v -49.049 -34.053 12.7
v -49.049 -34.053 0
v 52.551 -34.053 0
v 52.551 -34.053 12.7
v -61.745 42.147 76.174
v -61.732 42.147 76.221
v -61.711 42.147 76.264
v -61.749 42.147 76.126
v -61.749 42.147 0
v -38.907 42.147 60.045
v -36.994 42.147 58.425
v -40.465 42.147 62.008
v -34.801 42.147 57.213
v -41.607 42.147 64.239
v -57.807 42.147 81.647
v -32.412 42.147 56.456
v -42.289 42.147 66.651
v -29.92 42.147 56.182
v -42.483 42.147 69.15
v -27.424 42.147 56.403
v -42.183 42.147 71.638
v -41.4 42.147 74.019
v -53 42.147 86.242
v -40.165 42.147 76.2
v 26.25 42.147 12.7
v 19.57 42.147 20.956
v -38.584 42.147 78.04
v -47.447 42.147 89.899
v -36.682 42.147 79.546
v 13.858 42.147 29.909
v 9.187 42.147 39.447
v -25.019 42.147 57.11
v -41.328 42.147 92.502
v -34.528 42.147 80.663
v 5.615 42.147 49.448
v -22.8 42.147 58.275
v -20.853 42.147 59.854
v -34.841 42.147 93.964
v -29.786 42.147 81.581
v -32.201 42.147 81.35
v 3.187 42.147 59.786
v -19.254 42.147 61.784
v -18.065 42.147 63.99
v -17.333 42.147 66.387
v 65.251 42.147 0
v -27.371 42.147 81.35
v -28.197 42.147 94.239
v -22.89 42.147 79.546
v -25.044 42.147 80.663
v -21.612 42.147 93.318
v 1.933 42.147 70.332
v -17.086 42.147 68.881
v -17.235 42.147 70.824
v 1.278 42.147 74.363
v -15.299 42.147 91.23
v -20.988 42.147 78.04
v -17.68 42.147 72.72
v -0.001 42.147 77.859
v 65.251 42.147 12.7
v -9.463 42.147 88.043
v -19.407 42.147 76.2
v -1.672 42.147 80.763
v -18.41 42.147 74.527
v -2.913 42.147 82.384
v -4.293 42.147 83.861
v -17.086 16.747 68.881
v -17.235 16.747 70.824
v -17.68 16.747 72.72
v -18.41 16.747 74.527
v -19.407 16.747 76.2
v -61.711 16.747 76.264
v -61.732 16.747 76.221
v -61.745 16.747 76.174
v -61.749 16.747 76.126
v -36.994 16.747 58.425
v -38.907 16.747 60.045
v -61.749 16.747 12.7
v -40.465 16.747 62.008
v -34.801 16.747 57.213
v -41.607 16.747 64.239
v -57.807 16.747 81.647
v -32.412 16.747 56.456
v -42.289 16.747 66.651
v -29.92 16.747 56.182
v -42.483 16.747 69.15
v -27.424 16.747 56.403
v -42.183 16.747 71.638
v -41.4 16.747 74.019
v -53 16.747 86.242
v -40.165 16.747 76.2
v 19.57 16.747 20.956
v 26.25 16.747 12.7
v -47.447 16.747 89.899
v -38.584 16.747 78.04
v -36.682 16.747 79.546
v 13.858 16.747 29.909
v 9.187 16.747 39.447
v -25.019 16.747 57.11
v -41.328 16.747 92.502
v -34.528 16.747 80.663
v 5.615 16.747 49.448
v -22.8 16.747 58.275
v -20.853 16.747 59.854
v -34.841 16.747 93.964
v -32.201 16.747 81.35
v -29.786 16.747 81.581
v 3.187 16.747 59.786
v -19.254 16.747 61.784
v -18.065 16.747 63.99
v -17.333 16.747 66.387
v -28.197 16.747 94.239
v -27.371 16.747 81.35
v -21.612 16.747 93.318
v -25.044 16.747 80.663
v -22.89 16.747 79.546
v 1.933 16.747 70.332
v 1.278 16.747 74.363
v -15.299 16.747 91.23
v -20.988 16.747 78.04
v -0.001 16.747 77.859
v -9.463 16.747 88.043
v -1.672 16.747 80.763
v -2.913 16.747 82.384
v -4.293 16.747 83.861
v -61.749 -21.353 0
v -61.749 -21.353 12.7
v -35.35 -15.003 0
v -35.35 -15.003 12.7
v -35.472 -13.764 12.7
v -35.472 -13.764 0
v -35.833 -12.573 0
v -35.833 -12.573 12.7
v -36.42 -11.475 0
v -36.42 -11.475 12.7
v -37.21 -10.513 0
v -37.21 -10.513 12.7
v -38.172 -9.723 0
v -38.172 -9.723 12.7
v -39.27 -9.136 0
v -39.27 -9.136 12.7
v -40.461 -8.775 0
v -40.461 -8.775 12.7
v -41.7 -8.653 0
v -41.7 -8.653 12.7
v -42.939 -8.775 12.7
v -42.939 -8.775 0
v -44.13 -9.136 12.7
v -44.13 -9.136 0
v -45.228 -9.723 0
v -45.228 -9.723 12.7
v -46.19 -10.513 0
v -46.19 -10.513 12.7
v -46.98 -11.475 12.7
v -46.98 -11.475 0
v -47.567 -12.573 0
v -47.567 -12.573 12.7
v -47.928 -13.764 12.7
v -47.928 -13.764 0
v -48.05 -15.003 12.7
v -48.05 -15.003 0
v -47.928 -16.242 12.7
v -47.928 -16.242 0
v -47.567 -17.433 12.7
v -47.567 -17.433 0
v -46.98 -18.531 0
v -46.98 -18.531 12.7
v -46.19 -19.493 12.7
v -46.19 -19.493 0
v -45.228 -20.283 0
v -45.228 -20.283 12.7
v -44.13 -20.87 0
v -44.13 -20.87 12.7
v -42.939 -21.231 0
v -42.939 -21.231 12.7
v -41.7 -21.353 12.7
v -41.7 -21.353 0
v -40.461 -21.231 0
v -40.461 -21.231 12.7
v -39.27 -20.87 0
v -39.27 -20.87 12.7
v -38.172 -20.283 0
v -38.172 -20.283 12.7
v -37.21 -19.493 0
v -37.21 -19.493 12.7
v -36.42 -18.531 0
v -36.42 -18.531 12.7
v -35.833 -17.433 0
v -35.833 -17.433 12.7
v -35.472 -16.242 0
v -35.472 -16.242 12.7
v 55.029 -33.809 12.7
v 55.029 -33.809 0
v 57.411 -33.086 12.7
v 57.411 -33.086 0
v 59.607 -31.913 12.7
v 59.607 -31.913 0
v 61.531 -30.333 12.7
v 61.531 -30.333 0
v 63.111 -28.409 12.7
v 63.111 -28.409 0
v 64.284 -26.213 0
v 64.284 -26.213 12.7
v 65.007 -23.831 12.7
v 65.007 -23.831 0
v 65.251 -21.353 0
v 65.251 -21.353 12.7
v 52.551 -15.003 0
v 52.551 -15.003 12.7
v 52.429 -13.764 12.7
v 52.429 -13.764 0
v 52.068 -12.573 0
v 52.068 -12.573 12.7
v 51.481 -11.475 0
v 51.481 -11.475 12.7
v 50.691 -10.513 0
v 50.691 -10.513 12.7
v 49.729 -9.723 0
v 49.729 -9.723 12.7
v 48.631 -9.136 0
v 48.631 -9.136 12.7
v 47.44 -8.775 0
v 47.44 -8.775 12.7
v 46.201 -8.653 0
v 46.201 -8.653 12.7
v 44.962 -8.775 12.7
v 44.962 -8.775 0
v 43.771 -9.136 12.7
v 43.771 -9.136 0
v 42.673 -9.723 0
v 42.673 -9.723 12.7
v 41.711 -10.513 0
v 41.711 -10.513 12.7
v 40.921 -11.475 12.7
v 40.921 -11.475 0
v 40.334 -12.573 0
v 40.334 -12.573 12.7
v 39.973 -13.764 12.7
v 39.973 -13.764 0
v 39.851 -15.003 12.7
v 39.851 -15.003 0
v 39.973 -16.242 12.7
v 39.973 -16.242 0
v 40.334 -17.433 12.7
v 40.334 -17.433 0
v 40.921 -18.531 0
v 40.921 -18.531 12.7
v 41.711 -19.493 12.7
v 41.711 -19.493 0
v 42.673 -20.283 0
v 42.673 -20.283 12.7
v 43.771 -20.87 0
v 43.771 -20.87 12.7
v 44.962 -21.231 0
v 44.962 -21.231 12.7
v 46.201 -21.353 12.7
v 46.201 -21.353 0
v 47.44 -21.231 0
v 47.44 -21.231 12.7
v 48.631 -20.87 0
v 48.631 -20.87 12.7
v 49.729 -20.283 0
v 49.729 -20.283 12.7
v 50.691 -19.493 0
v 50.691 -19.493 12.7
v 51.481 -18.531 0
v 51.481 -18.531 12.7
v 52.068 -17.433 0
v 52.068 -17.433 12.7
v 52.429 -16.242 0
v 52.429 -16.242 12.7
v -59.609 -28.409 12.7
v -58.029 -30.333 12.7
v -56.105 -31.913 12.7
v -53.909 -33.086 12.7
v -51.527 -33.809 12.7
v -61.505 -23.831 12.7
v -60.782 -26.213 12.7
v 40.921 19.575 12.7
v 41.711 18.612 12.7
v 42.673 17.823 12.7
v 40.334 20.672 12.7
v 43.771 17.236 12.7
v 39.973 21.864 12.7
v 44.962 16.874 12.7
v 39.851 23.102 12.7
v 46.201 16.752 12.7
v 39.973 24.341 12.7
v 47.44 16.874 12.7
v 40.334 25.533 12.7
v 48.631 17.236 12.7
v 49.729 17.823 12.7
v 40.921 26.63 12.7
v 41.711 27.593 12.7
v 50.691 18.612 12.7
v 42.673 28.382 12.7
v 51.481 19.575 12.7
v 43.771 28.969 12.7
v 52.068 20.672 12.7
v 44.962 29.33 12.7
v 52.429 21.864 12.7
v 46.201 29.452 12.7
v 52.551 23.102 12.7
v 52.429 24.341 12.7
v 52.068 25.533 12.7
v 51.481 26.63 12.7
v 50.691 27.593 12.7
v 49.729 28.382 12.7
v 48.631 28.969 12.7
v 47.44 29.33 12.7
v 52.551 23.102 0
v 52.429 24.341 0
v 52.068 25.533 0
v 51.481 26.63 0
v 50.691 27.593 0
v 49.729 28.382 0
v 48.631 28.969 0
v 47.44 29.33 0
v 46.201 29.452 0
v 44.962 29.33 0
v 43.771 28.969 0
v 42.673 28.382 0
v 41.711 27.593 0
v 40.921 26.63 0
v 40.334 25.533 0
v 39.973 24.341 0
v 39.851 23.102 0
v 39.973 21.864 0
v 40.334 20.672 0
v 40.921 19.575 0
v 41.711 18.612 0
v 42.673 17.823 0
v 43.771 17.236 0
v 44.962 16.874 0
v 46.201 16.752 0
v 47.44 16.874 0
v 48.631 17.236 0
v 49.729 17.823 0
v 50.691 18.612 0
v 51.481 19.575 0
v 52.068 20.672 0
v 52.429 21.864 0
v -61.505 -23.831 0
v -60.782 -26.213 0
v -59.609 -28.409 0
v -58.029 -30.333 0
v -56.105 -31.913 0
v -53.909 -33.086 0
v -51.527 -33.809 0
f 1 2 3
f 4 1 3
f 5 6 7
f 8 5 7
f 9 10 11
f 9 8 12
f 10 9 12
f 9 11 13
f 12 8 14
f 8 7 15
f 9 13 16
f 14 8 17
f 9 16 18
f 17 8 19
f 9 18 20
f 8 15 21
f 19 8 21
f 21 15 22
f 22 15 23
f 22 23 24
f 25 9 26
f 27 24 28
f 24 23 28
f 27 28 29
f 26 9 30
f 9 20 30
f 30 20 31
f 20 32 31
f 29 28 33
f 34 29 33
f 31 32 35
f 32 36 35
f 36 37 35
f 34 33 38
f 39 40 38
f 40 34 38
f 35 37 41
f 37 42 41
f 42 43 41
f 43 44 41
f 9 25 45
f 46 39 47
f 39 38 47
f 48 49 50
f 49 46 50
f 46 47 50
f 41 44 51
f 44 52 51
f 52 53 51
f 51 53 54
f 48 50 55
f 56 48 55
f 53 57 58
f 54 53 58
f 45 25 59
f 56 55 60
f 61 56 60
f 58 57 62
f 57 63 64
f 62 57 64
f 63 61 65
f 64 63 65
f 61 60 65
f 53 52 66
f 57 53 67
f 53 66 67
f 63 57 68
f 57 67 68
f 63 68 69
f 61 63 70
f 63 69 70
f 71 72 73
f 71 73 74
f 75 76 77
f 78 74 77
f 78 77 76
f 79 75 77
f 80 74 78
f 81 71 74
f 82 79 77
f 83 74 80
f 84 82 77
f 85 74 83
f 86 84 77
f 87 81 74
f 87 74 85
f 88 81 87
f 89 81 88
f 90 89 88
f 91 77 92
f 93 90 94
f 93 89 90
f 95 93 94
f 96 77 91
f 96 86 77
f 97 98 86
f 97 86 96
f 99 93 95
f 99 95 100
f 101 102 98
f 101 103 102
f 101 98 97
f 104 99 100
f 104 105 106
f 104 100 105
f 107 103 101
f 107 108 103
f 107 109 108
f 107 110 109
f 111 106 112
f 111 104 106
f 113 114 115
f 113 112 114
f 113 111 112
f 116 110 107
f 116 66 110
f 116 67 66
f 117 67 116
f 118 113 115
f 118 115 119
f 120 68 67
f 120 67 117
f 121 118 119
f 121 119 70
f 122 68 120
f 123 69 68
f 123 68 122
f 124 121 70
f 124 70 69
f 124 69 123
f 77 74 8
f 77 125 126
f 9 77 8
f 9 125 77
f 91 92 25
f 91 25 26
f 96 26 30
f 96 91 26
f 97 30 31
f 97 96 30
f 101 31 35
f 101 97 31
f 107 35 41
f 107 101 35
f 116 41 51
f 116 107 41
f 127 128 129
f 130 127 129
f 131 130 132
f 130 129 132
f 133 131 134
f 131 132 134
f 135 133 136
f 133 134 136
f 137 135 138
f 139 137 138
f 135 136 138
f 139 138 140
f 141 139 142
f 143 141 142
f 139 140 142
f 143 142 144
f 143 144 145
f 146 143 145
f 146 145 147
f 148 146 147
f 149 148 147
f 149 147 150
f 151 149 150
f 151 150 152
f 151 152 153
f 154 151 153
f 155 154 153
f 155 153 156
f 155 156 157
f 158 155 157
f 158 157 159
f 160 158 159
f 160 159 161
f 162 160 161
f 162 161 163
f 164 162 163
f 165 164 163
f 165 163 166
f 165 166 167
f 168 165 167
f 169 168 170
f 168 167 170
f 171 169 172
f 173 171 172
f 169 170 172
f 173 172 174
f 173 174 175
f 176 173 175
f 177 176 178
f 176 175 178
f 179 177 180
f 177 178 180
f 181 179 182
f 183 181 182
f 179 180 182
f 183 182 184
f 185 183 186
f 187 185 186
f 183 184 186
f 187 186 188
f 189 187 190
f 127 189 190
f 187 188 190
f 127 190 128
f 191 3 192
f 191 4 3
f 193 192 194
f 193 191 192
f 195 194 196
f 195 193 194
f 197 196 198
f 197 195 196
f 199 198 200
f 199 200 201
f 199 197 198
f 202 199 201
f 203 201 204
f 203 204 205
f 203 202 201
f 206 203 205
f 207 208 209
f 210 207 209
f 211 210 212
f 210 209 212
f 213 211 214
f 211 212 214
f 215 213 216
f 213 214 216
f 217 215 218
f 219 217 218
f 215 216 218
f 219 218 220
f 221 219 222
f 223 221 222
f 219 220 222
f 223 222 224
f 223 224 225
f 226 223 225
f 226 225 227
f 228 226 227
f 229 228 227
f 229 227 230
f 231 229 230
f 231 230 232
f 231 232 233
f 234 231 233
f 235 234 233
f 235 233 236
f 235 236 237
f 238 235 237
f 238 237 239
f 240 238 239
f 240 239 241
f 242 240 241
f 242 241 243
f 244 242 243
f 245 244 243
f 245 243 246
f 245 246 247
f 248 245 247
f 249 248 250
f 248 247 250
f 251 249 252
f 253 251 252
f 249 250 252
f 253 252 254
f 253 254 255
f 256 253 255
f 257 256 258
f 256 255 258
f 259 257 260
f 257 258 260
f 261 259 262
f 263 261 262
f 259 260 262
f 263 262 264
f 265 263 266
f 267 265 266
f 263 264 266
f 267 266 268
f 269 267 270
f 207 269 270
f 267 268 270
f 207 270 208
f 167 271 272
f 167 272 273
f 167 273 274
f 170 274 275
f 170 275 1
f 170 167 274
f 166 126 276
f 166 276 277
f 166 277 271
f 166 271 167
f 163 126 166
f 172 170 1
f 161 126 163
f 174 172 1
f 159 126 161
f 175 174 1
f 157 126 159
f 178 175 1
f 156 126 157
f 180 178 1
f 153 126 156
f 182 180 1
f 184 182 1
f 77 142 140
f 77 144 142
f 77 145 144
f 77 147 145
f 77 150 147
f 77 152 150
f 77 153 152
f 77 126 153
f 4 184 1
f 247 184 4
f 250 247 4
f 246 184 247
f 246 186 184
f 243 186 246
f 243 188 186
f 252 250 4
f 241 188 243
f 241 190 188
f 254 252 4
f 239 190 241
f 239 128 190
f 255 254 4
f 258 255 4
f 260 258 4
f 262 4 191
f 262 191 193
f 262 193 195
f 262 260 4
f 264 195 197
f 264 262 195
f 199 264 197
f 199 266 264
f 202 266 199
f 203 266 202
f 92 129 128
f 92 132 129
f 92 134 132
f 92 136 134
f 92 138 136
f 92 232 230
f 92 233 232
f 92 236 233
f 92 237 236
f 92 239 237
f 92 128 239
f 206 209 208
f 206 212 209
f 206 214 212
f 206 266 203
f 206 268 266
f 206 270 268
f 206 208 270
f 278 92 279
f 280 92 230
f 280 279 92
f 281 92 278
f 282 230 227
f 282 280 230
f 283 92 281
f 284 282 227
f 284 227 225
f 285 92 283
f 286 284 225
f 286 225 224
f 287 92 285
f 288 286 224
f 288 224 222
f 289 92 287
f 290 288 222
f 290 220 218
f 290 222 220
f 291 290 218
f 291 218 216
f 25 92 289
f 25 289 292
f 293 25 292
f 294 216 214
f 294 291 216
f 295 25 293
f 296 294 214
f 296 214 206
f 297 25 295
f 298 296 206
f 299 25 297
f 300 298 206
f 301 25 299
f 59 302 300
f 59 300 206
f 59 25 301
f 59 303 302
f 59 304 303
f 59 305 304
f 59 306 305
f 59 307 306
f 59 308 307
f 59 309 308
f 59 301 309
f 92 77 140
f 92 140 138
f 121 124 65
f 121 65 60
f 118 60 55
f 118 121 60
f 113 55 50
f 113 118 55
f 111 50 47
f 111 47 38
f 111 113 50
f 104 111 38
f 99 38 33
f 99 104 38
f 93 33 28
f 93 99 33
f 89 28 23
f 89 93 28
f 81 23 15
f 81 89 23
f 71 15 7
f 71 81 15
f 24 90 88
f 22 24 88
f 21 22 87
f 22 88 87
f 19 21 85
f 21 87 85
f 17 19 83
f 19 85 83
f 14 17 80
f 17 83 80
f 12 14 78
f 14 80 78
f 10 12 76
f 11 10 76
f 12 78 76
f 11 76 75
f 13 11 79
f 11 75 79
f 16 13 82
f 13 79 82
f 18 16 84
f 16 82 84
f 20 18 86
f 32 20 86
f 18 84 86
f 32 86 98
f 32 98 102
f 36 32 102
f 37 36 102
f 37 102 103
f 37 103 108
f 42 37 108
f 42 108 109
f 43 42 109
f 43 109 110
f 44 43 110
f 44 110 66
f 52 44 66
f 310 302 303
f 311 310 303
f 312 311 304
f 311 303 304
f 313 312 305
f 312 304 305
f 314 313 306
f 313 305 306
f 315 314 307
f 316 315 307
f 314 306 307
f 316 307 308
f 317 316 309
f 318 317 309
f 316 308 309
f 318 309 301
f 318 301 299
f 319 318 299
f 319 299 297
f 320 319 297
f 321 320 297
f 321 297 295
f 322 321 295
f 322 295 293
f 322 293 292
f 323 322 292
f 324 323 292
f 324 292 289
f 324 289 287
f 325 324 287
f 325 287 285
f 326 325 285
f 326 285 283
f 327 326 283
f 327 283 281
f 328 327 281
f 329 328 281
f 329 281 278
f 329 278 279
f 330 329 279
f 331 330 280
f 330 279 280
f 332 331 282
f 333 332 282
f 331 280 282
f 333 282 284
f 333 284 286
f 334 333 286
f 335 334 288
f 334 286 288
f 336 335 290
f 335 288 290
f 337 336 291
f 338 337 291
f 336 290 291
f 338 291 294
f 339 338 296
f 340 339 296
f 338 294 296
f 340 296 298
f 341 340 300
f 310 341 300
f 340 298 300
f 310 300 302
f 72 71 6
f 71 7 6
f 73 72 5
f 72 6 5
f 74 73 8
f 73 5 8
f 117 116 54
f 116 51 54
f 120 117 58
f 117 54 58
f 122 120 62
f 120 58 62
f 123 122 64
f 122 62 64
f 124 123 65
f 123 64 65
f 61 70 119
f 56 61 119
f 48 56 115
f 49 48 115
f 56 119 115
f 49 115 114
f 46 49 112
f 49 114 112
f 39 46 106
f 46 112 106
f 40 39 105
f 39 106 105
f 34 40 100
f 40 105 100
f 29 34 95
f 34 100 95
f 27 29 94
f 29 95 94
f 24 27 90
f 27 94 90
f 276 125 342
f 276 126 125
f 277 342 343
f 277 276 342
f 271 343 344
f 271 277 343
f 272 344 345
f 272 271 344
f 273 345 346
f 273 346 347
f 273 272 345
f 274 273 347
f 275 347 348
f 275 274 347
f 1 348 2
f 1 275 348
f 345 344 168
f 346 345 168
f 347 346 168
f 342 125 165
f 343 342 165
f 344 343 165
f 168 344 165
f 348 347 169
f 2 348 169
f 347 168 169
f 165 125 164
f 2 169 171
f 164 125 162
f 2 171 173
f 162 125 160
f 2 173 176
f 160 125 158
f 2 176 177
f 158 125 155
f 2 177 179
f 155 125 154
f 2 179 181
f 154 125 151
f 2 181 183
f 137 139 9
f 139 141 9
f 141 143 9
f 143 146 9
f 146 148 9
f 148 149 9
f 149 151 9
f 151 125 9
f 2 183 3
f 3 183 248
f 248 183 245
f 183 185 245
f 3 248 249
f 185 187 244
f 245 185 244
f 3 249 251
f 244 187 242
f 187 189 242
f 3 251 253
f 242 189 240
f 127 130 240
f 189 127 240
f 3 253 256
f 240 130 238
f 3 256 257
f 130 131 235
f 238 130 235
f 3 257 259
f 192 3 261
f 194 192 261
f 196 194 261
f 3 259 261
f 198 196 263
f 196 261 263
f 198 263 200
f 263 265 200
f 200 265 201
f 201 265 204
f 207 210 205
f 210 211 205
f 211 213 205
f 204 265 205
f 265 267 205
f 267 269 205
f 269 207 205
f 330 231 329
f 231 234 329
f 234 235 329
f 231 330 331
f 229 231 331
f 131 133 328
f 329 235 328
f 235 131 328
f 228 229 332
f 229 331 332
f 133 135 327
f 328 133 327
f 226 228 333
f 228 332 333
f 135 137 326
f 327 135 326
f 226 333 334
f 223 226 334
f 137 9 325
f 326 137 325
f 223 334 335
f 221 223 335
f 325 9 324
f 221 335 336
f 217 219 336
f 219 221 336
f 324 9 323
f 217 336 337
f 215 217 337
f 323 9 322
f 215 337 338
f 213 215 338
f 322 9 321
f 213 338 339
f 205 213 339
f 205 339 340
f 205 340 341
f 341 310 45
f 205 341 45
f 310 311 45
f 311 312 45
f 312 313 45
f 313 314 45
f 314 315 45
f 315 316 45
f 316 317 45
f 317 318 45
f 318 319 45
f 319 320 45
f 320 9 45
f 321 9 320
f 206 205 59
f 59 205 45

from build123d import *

# Parameters (mm, degrees)
F0_W      = 127
F0_H      = 76.2
F1_DEPTH  = 12.7
F2_R      = 12.7
F3_R      = 12.7
F4_W      = 63.5
F4_H      = 25.4
F5_DEPTH  = 63.5
F7_DEPTH  = 25.4
F8_DEPTH  = 25.4
F9_R      = 20.636463447
F11_DEPTH = 25.4010001
F12_DEPTH = 25.4010001
F13_R     = 0.2708197303
F14_R     = 6.35
F15_DEPTH = 12.7010001
F16_DEPTH = 12.7010001
F17_DEPTH = 12.7010001


with BuildPart() as f1:
    # F0 (on Top) → F1 (new body)
    with BuildSketch(Plane.XY):
        with Locations((1.7509019642, 4.0471330285)):
            Rectangle(F0_W, F0_H)
    extrude(amount=F1_DEPTH)

    # F2
    f2_edges = [f1.edges().sort_by_distance(p)[0] for p in [
        (-61.749098, -34.052867, 6.35),
    ]]
    fillet(f2_edges, radius=F2_R)

    # F3
    f3_edges = [f1.edges().sort_by_distance(p)[0] for p in [
        (65.250902, -34.052867, 6.35),
    ]]
    fillet(f3_edges, radius=F3_R)

    # F4 (on face) → F5 (join)
    with BuildSketch(Plane.XY.offset(12.7)):
        with Locations((-29.9990980358, 29.4471330285)):
            Rectangle(F4_W, F4_H)
    extrude(amount=F5_DEPTH)

    # F6 (on face) → F7 (join)
    with BuildSketch(Plane.XZ.offset(-16.7471330285)):
        with BuildLine():
            Line((-61.7490980358, 76.2), (1.7509019642, 76.2))
            ThreePointArc((1.7509019642, 76.2), (-29.9990980358, 94.2832173296), (-61.7490980358, 76.2))
        make_face()
    extrude(amount=-F7_DEPTH)

    # F6 (on face) → F8 (join)
    with BuildSketch(Plane.XZ.offset(-16.7471330285)):
        with BuildLine():
            ThreePointArc((26.2496182163, 12.7), (8.0879587681, 42.1689953939), (1.7509019642, 76.2))
            Line((1.7509019642, 76.2), (1.7509019642, 12.7))
            Line((1.7509019642, 12.7), (26.2496182163, 12.7))
        make_face()
    extrude(amount=-F8_DEPTH)

    # F9
    f9_edges = [f1.edges().sort_by_distance(p)[0] for p in [
        (1.750902, 29.447133, 76.2),
    ]]
    fillet(f9_edges, radius=F9_R)

    # F10 (on face) → F11 (cut, through all)
    with BuildSketch(Plane.XZ.offset(-16.7471330285)):
        with BuildLine():
            ThreePointArc((-40.1649535069, 76.2), (-33.624820371, 56.7753634634), (-17.0858500555, 68.8812424863))
            ThreePointArc((-17.0858500555, 68.8812424863), (-17.6799710326, 72.7202128018), (-19.4067466041, 76.2))
            Line((-19.4067466041, 76.2), (-40.1649535069, 76.2))
        make_face()
    extrude(amount=-F11_DEPTH, mode=Mode.SUBTRACT)

    # F10 (on face) → F12 (cut, through all)
    with BuildSketch(Plane.XZ.offset(-16.7471330285)):
        with BuildLine():
            Line((-40.1649535069, 76.2), (-19.4067466041, 76.2))
            ThreePointArc((-19.4067466041, 76.2), (-29.7858500555, 81.5812424863), (-40.1649535069, 76.2))
        make_face()
    extrude(amount=-F12_DEPTH, mode=Mode.SUBTRACT)

    # F13
    f13_edges = [f1.edges().sort_by_distance(p)[0] for p in [
        (-61.749098, 29.447133, 76.2),
    ]]
    fillet(f13_edges, radius=F13_R)

    # F14 (on face) → F15 (cut, through all)
    with BuildSketch(Plane.XY.offset(12.7)):
        with Locations((-41.6999144272, -15.0028669715)):
            Circle(F14_R)
    extrude(amount=-F15_DEPTH, mode=Mode.SUBTRACT)

    # F14 (on face) → F16 (cut, through all)
    with BuildSketch(Plane.XY.offset(12.7)):
        with Locations((46.2009019642, -15.0028669715)):
            Circle(F14_R)
    extrude(amount=-F16_DEPTH, mode=Mode.SUBTRACT)

    # F14 (on face) → F17 (cut, through all)
    with BuildSketch(Plane.XY.offset(12.7)):
        with Locations((46.2009019642, 23.1024639082)):
            Circle(F14_R)
    extrude(amount=-F17_DEPTH, mode=Mode.SUBTRACT)


solid = f1.part
